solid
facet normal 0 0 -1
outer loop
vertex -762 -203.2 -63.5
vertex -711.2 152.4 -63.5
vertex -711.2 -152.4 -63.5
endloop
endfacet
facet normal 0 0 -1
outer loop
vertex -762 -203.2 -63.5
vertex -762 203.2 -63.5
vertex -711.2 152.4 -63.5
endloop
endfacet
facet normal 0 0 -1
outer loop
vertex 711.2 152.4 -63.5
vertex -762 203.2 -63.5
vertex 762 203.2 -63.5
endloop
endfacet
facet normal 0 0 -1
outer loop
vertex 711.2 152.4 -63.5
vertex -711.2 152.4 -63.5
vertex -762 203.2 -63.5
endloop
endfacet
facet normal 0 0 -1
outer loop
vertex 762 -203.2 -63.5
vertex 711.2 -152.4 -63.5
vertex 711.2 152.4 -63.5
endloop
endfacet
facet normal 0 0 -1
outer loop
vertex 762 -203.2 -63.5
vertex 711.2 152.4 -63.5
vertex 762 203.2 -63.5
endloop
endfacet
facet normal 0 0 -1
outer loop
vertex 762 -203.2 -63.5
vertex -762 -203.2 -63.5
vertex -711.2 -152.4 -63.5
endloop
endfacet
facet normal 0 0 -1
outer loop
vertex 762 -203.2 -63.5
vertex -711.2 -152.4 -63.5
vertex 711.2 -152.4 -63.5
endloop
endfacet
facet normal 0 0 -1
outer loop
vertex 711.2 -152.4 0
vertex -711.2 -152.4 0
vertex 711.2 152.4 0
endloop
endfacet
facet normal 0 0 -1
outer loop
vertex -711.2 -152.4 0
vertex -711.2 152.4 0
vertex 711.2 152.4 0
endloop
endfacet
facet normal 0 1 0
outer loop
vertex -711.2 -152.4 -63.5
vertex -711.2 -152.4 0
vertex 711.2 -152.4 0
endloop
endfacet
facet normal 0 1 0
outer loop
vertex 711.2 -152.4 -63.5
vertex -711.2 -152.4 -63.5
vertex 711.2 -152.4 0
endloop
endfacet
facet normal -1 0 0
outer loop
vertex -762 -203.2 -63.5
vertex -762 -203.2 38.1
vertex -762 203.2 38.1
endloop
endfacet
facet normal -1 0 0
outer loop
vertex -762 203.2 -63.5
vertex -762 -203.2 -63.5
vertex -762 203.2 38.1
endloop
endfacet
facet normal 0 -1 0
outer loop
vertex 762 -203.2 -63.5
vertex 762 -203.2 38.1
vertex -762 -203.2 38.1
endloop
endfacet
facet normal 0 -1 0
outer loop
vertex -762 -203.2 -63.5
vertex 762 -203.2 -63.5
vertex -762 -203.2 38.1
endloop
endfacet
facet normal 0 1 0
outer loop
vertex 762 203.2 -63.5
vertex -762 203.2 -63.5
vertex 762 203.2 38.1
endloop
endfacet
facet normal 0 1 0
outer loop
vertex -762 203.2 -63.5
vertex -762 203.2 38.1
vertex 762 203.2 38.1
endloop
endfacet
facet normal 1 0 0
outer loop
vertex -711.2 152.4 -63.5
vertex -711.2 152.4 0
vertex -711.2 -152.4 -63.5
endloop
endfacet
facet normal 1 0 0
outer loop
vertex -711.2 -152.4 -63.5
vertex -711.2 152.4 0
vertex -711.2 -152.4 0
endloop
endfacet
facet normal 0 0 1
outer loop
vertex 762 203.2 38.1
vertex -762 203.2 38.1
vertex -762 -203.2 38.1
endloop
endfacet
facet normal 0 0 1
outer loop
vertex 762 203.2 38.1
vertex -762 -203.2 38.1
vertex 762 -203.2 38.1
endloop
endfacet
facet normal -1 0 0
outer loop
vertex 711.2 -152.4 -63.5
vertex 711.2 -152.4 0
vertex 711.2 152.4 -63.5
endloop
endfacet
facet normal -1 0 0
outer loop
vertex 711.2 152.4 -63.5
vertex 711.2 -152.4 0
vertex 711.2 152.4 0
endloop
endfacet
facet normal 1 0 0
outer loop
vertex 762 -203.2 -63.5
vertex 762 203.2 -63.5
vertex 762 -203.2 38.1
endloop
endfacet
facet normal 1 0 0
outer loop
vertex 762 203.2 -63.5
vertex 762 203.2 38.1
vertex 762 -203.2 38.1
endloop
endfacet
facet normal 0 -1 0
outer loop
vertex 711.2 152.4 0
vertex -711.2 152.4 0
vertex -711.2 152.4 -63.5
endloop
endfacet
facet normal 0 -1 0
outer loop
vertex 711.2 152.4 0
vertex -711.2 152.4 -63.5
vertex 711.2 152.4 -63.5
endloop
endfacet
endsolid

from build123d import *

# Parameters (mm, degrees)
F0_W     = 1524
F0_H     = 406.4
F1_DEPTH = 38.1
F2_W     = 1422.4
F2_H     = 50.8
F3_DEPTH = 63.5


with BuildPart() as f1:
    # F0 (on Top) → F1 (new body)
    with BuildSketch(Plane.XY):
        Rectangle(F0_W, F0_H)
    extrude(amount=F1_DEPTH)

    # F2 (on face) → F3 (join)
    with BuildSketch(Plane(origin=(0, 0, 0), x_dir=(1, 0, 0), z_dir=(0, 0, -1))):
        Polygon((-711.2, 152.4), (-711.2, 203.2), (-762, 203.2), (-762, -203.2), (-711.2, -203.2), (-711.2, -152.4), align=None)
        Polygon((762, -203.2), (762, 203.2), (711.2, 203.2), (711.2, 152.4), (711.2, -152.4), (711.2, -203.2), align=None)
        with Locations((0, -177.8)):
            Rectangle(F2_W, F2_H)
        with Locations((0, 177.8)):
            Rectangle(F2_W, F2_H)
    extrude(amount=F3_DEPTH)


solid = f1.part
